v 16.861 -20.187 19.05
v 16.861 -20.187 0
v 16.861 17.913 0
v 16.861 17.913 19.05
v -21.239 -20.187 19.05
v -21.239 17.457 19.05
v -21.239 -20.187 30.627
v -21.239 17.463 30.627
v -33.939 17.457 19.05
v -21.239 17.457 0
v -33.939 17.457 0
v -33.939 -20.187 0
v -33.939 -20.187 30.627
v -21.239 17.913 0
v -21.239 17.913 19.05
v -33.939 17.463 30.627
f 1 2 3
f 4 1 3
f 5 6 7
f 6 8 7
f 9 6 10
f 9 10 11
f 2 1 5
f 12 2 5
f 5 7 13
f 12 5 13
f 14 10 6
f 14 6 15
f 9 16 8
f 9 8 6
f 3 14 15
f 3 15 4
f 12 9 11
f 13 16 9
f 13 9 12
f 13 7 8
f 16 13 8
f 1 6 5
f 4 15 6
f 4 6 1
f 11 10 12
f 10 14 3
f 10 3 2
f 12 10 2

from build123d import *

# Parameters (mm, degrees)
F0_W     = 38.1
F0_H     = 38.1
F1_DEPTH = 19.05
F3_DEPTH = 12.7
F4_DEPTH = 19.05


with BuildPart() as f1:
    # F0 (on Top) → F1 (new body)
    with BuildSketch(Plane.XY):
        with Locations((-2.1893925067, -1.1373543657)):
            Rectangle(F0_W, F0_H)
    extrude(amount=F1_DEPTH)



with BuildPart() as f3:
    # F2 (on face) → F3 (new body)
    with BuildSketch(Plane(origin=(-21.2393925067, 0, 0), x_dir=(0, -1, 0), z_dir=(-1, 0, 0))):
        Polygon((-17.4572191403, 19.05), (20.1873543657, 19.05), (20.1873543657, 30.6271831505), (-17.4629575457, 30.6271831505), align=None)
    extrude(amount=F3_DEPTH)


with BuildPart() as f1_1:
    add(f1.part)
    # F4 (add): a face of the model
    f4_faces = [f3.part.faces().sort_by_distance(p)[0] for p in [
        (-27.5893925067, -1.3650676127, 19.05),
    ]]

    add(f3.part)  # F4 merges F3
    extrude(f4_faces, amount=F4_DEPTH)


solid = f1_1.part
